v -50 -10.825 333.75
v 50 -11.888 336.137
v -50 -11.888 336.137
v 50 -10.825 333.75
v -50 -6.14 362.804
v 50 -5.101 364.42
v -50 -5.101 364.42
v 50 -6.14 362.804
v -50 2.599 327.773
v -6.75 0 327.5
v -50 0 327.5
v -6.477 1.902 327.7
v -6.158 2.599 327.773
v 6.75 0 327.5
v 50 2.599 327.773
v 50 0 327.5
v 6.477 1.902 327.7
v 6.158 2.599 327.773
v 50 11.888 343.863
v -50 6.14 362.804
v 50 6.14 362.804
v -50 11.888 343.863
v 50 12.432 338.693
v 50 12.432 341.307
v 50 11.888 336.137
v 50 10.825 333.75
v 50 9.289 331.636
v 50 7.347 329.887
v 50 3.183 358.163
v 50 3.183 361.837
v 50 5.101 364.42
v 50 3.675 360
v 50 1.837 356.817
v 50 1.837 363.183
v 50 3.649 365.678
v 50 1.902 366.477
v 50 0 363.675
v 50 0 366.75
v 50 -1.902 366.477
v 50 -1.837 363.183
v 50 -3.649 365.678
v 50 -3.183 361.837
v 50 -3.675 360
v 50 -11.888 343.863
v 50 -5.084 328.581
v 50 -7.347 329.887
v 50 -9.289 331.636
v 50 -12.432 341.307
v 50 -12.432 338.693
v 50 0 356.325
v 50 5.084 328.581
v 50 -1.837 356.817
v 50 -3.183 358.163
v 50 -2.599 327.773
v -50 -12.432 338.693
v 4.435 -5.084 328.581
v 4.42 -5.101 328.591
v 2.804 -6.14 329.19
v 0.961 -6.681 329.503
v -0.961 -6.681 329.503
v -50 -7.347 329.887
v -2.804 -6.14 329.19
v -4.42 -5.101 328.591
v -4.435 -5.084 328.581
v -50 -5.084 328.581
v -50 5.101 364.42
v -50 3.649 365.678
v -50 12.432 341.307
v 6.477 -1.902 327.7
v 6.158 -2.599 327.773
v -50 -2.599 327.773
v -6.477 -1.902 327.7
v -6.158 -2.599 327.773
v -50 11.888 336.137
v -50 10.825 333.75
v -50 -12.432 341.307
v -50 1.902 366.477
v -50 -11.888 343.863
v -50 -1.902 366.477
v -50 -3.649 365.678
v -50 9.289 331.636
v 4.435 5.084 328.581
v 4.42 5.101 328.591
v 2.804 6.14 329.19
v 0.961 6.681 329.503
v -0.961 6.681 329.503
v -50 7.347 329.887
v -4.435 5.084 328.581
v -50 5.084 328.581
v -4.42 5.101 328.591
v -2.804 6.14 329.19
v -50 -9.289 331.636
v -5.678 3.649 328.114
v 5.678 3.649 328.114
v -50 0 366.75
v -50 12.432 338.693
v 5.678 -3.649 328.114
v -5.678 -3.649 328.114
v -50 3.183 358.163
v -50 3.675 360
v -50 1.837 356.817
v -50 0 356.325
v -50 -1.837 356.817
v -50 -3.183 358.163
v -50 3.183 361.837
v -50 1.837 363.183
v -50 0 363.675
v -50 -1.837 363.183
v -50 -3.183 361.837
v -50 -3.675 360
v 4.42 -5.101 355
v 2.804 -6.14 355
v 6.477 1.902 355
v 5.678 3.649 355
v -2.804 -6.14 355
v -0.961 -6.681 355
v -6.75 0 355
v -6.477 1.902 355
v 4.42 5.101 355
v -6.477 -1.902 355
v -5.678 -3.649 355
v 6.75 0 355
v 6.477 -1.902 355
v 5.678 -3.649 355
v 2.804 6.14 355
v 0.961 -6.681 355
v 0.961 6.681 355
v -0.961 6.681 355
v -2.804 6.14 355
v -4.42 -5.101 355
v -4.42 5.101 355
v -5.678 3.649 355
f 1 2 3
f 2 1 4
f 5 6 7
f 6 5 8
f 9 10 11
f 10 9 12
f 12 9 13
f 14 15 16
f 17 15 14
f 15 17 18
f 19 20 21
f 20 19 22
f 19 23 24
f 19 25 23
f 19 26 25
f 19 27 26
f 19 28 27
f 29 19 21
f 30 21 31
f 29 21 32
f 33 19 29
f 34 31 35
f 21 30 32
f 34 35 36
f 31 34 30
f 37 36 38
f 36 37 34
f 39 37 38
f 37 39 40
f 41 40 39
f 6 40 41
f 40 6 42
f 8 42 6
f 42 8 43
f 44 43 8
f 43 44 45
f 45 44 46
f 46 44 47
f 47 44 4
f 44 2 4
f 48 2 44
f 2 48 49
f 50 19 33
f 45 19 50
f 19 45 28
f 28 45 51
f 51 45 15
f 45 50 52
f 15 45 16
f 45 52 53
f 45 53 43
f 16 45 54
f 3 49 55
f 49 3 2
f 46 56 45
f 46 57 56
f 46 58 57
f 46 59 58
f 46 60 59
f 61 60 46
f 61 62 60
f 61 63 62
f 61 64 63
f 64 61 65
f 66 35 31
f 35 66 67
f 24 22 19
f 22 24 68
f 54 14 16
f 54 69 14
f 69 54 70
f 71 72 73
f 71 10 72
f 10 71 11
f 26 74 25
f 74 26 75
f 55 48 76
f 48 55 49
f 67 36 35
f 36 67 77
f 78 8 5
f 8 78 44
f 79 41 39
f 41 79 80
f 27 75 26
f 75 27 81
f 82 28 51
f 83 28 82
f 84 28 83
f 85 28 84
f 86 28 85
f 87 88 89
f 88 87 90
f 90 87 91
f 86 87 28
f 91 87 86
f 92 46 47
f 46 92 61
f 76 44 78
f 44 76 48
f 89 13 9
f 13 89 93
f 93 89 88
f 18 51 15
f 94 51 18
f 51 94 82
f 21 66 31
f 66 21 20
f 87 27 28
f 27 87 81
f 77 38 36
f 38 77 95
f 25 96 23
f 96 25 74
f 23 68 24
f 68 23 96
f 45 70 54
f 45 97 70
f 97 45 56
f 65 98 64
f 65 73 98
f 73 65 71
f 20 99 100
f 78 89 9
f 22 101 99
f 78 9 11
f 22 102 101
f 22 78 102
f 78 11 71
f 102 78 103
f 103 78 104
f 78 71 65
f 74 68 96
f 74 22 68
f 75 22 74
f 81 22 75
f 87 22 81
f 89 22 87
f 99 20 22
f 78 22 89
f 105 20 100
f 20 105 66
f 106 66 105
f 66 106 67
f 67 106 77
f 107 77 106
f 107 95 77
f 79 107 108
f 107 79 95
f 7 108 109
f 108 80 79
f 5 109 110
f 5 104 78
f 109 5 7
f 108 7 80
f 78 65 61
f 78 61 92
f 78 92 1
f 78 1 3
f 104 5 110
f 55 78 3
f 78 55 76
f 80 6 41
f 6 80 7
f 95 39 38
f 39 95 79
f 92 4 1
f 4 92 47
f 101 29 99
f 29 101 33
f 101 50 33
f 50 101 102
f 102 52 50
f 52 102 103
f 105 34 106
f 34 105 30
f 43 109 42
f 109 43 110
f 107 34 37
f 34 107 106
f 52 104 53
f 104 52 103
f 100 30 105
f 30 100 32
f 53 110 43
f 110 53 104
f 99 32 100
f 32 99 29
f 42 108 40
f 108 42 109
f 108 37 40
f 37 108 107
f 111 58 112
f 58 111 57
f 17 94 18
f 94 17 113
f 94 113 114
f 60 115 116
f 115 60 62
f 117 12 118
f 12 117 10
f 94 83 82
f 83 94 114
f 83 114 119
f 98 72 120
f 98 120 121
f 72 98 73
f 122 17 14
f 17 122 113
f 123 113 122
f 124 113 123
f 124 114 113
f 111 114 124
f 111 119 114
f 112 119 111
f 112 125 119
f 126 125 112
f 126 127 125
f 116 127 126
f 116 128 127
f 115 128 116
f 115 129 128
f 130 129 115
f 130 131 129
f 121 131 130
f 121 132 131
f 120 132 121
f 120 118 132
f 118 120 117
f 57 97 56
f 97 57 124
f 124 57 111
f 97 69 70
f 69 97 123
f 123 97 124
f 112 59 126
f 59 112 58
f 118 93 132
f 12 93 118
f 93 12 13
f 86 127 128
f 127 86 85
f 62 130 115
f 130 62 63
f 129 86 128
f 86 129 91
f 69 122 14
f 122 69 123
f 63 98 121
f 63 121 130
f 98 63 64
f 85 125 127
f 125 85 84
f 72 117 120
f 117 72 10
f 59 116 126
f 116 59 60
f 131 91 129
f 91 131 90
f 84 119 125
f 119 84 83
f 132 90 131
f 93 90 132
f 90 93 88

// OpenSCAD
module axle(args) {
    translate([0,0,zz]) {
        rotate([0,90,0]) {
            hull() {
                cylinder(d=10, h=160, center=true);
                translate([-25,0,0]) cylinder(d=20, h=160, center=true);
            }
        }
        rotate([0,90,0]) union() {
            rotate_extrude($fn=60) translate([622/2 - 15/2,0,0]) square(size=[15, 15], center=true);
            #rotate_extrude($fn=60) translate([584/2 - 35/2,0,0]) square(size=[35, 35], center=true);
            rotate_extrude($fn=60) translate([622/2 + 42/2 + 0,0,0]) circle(d=42);
        }
    }
}

module rod1(inflate=0) {
    translate([xx, yy, 2-inflate]) rotate([0,0,0]) cylinder(d=tubed+inflate, h=len+2*inflate, center=false);
}

module rod2(inflate=0) {
    translate([110, 0, 5-inflate])
        rotate([0,-angle,0])
            cylinder(d=tubed+inflate, h=len+inflate, center=false);
}

module rod3(inflate=0) {
    translate([xx, -yy, 2-inflate]) rotate([0,0,0]) cylinder(d=tubed+inflate, h=len+2*inflate, center=false);
}

module rods(inflate=0) {
    rod1(inflate);
    rod2(inflate);
    rod3(inflate);
}

module bolt1(inflate=0) {
    translate([91, yy, 0]) cylinder(d=8 + inflate, h=20, center=false);
}
module bolt2(inflate=0) {
    translate([91, -yy, 0]) cylinder(d=8 + inflate, h=20, center=false);
}
module boltHoles(inflate=0, height=100) {
    bolt1();
    bolt2();
}

module bottomCap() {
    difference() {
        intersection() {
            union() {
                hull() {
                    rod1(10);
                    bolt1(12);
                }
                hull() {
                    rod3(10);
                    bolt2(12);
                }
                hull() {
                    rod2(10);
                    bolt1(12);
                }
                hull() {
                    rod2(10);
                    bolt2(12);
                }
            }
            translate([45,0,0]) cylinder(d=200, h=20, center=false);
        }
        #rods();
        axle();
        boltHoles();
    }
}

module topCap() {
    difference() {
        union() {
            intersection() {
                hull() {
                    rods(10);
                }
                translate([45,0,312]) cylinder(d=200, h=30, center=false);
            }
            hull() {
                translate([55,0,341]) {
                    cube([8, 34, 58], center=true);
                    translate([0,0,-15]) cube([8, 63, 25], center=true);
                }
            }
        }
        rods();
        axle();
    }
}

module gauges(height=1) {
    for (ii=[0:8]) {
        rotate([0,0,180 + 35*ii]) hull() {
            translate([0,0,(8+height)/2]) cube(size=[2, 4, 15+height], center=true);
            translate([25 + ii, 0, 4]) cube([0.25,0.25,15], center=true);
        }
    }
}
module centerGauge(zz=75) {
    translate([xx,0,zz]) difference() {
        union() {
            translate([-30,0,0]) cube([12, 40, 12], center=true);
            translate([-19,0,0]) cube([20, 12, 12], center=true);
        }
        rotate([0,-90,0]) cylinder(d=4.8, h=34, center=false, $fn=12);
    }
}
module centerGaugeBase(zz=75) {
    difference() {
        translate([0,0,zz]) {
            hull() {
                translate([xx,yy,0]) cylinder(d=tubed+4, h=12, center=true);
                translate([xx,-yy,0]) cylinder(d=tubed+4, h=12, center=true);
            }
        }
        translate([xx, 0, zz]) cube([2, 200, 25], center=true);
        translate([0, 0, zz]) rotate([0,90,0]) cylinder(d=4.8, h=200, center=true, $fn=12);
        rod1();
        rod3();
        translate([xx + 6, yy - tubed + 1, zz]) bolt832();
        translate([xx + 6, -yy + tubed - 1, zz]) bolt832();
    }
}

module bolt832() {
    rotate([0,-90,0]) {
        rotate([180,0,0]) cylinder(d=9.75, h=10, center=false);
        cylinder(d=3.75, h=15, center=false, $fn=12);
        cylinder(d=5.25, h=6.5, center=false, $fn=12);
    }
}
module lateralGauge() {
    difference() {
        union() {
            hull() {
                translate([0,-0.5, 0]) cube([20, 1, 30]);
                cylinder(d=tubed+4, h=30, center=false);
            }
            hull() {
                translate([0,-0.5, 0]) cube([45, 1, 15]);
                cylinder(d=tubed+4, h=15, center=false);
            }
        }
        cylinder(d=tubed, h=100, center=true);
    }
}
module screw() {
    translate([0, 0, -5.5]) {
        difference() {
            cylinder(d=9, h=10, center=false, $fn=20);
            rotate_extrude($fn=20) translate([5.5 + 2,0,0]) circle(r=5.5);
        }
        rotate([180,0,0]) cylinder(d=4, h=25, center=false, $fn=20);
    }
}

module gaugeBase(angle) {
    intersection() {
        difference() {
            union() {
                hull() {
                    translate([0,2,0]) cylinder(d=tubed, h=6, center=false);
                    translate([0,-32,0]) cylinder(d=10, h=6, center=false);
                    translate([25,0,0]) cylinder(d=10, h=6, center=false);
                    translate([-25,0,0]) cylinder(d=10, h=6, center=false);
                }
                hull() {
                    rotate([angle,0,0]) cylinder(d=tubed+5, h=35, center=false);
                    translate([0,-25,0]) cylinder(d=3, h=6, center=false);
                }
            }
            rotate([angle,0,0]) translate([0,0,4]) cylinder(d=tubed, h=40, center=false);
            translate([25,0,6]) screw();
            translate([0,-32,6]) screw();
            translate([-25,0,6]) screw();
        }
        cylinder(r=100, h=100, center=false);
    }
}
module radialGauge() {
    difference() {
        union() {
            hull() {
                translate([0,-0.5, 0]) cube([30, 1, 75]);
                cylinder(d=tubed+4, h=75, center=false);
            }
        }
        cylinder(d=tubed, h=100, center=false);
    }
}
module centerJig(len=100) {
    translate([0,0,zz]) {
        rotate([0,90,0]) {
            difference() {
                hull() {
                    cylinder(d=tubed, h=len, center=true);
                    translate([20,0,0]) cylinder(d=25, h=len, center=true);
                }
                cylinder(d=2*25.4/8+1, h=len + 20, center=true);
                *translate([20,0,0]) cylinder(d=18, h=len + 20, center=true);
                #rotate([0,90,0]) translate([0,0,5]) cylinder(d=tubed, h=300, center=false);
            }
        }
    }
}
len = 335;
tubed = 13.5;
xx = 56 + tubed/2;
yy = 63/2;
zz=360;
angle = 7;
bottomCap();
topCap();
*lateralGauge();
*gaugeBase(35);
*radialGauge();
centerGaugeBase();
*centerGauge();
!centerJig(100);
